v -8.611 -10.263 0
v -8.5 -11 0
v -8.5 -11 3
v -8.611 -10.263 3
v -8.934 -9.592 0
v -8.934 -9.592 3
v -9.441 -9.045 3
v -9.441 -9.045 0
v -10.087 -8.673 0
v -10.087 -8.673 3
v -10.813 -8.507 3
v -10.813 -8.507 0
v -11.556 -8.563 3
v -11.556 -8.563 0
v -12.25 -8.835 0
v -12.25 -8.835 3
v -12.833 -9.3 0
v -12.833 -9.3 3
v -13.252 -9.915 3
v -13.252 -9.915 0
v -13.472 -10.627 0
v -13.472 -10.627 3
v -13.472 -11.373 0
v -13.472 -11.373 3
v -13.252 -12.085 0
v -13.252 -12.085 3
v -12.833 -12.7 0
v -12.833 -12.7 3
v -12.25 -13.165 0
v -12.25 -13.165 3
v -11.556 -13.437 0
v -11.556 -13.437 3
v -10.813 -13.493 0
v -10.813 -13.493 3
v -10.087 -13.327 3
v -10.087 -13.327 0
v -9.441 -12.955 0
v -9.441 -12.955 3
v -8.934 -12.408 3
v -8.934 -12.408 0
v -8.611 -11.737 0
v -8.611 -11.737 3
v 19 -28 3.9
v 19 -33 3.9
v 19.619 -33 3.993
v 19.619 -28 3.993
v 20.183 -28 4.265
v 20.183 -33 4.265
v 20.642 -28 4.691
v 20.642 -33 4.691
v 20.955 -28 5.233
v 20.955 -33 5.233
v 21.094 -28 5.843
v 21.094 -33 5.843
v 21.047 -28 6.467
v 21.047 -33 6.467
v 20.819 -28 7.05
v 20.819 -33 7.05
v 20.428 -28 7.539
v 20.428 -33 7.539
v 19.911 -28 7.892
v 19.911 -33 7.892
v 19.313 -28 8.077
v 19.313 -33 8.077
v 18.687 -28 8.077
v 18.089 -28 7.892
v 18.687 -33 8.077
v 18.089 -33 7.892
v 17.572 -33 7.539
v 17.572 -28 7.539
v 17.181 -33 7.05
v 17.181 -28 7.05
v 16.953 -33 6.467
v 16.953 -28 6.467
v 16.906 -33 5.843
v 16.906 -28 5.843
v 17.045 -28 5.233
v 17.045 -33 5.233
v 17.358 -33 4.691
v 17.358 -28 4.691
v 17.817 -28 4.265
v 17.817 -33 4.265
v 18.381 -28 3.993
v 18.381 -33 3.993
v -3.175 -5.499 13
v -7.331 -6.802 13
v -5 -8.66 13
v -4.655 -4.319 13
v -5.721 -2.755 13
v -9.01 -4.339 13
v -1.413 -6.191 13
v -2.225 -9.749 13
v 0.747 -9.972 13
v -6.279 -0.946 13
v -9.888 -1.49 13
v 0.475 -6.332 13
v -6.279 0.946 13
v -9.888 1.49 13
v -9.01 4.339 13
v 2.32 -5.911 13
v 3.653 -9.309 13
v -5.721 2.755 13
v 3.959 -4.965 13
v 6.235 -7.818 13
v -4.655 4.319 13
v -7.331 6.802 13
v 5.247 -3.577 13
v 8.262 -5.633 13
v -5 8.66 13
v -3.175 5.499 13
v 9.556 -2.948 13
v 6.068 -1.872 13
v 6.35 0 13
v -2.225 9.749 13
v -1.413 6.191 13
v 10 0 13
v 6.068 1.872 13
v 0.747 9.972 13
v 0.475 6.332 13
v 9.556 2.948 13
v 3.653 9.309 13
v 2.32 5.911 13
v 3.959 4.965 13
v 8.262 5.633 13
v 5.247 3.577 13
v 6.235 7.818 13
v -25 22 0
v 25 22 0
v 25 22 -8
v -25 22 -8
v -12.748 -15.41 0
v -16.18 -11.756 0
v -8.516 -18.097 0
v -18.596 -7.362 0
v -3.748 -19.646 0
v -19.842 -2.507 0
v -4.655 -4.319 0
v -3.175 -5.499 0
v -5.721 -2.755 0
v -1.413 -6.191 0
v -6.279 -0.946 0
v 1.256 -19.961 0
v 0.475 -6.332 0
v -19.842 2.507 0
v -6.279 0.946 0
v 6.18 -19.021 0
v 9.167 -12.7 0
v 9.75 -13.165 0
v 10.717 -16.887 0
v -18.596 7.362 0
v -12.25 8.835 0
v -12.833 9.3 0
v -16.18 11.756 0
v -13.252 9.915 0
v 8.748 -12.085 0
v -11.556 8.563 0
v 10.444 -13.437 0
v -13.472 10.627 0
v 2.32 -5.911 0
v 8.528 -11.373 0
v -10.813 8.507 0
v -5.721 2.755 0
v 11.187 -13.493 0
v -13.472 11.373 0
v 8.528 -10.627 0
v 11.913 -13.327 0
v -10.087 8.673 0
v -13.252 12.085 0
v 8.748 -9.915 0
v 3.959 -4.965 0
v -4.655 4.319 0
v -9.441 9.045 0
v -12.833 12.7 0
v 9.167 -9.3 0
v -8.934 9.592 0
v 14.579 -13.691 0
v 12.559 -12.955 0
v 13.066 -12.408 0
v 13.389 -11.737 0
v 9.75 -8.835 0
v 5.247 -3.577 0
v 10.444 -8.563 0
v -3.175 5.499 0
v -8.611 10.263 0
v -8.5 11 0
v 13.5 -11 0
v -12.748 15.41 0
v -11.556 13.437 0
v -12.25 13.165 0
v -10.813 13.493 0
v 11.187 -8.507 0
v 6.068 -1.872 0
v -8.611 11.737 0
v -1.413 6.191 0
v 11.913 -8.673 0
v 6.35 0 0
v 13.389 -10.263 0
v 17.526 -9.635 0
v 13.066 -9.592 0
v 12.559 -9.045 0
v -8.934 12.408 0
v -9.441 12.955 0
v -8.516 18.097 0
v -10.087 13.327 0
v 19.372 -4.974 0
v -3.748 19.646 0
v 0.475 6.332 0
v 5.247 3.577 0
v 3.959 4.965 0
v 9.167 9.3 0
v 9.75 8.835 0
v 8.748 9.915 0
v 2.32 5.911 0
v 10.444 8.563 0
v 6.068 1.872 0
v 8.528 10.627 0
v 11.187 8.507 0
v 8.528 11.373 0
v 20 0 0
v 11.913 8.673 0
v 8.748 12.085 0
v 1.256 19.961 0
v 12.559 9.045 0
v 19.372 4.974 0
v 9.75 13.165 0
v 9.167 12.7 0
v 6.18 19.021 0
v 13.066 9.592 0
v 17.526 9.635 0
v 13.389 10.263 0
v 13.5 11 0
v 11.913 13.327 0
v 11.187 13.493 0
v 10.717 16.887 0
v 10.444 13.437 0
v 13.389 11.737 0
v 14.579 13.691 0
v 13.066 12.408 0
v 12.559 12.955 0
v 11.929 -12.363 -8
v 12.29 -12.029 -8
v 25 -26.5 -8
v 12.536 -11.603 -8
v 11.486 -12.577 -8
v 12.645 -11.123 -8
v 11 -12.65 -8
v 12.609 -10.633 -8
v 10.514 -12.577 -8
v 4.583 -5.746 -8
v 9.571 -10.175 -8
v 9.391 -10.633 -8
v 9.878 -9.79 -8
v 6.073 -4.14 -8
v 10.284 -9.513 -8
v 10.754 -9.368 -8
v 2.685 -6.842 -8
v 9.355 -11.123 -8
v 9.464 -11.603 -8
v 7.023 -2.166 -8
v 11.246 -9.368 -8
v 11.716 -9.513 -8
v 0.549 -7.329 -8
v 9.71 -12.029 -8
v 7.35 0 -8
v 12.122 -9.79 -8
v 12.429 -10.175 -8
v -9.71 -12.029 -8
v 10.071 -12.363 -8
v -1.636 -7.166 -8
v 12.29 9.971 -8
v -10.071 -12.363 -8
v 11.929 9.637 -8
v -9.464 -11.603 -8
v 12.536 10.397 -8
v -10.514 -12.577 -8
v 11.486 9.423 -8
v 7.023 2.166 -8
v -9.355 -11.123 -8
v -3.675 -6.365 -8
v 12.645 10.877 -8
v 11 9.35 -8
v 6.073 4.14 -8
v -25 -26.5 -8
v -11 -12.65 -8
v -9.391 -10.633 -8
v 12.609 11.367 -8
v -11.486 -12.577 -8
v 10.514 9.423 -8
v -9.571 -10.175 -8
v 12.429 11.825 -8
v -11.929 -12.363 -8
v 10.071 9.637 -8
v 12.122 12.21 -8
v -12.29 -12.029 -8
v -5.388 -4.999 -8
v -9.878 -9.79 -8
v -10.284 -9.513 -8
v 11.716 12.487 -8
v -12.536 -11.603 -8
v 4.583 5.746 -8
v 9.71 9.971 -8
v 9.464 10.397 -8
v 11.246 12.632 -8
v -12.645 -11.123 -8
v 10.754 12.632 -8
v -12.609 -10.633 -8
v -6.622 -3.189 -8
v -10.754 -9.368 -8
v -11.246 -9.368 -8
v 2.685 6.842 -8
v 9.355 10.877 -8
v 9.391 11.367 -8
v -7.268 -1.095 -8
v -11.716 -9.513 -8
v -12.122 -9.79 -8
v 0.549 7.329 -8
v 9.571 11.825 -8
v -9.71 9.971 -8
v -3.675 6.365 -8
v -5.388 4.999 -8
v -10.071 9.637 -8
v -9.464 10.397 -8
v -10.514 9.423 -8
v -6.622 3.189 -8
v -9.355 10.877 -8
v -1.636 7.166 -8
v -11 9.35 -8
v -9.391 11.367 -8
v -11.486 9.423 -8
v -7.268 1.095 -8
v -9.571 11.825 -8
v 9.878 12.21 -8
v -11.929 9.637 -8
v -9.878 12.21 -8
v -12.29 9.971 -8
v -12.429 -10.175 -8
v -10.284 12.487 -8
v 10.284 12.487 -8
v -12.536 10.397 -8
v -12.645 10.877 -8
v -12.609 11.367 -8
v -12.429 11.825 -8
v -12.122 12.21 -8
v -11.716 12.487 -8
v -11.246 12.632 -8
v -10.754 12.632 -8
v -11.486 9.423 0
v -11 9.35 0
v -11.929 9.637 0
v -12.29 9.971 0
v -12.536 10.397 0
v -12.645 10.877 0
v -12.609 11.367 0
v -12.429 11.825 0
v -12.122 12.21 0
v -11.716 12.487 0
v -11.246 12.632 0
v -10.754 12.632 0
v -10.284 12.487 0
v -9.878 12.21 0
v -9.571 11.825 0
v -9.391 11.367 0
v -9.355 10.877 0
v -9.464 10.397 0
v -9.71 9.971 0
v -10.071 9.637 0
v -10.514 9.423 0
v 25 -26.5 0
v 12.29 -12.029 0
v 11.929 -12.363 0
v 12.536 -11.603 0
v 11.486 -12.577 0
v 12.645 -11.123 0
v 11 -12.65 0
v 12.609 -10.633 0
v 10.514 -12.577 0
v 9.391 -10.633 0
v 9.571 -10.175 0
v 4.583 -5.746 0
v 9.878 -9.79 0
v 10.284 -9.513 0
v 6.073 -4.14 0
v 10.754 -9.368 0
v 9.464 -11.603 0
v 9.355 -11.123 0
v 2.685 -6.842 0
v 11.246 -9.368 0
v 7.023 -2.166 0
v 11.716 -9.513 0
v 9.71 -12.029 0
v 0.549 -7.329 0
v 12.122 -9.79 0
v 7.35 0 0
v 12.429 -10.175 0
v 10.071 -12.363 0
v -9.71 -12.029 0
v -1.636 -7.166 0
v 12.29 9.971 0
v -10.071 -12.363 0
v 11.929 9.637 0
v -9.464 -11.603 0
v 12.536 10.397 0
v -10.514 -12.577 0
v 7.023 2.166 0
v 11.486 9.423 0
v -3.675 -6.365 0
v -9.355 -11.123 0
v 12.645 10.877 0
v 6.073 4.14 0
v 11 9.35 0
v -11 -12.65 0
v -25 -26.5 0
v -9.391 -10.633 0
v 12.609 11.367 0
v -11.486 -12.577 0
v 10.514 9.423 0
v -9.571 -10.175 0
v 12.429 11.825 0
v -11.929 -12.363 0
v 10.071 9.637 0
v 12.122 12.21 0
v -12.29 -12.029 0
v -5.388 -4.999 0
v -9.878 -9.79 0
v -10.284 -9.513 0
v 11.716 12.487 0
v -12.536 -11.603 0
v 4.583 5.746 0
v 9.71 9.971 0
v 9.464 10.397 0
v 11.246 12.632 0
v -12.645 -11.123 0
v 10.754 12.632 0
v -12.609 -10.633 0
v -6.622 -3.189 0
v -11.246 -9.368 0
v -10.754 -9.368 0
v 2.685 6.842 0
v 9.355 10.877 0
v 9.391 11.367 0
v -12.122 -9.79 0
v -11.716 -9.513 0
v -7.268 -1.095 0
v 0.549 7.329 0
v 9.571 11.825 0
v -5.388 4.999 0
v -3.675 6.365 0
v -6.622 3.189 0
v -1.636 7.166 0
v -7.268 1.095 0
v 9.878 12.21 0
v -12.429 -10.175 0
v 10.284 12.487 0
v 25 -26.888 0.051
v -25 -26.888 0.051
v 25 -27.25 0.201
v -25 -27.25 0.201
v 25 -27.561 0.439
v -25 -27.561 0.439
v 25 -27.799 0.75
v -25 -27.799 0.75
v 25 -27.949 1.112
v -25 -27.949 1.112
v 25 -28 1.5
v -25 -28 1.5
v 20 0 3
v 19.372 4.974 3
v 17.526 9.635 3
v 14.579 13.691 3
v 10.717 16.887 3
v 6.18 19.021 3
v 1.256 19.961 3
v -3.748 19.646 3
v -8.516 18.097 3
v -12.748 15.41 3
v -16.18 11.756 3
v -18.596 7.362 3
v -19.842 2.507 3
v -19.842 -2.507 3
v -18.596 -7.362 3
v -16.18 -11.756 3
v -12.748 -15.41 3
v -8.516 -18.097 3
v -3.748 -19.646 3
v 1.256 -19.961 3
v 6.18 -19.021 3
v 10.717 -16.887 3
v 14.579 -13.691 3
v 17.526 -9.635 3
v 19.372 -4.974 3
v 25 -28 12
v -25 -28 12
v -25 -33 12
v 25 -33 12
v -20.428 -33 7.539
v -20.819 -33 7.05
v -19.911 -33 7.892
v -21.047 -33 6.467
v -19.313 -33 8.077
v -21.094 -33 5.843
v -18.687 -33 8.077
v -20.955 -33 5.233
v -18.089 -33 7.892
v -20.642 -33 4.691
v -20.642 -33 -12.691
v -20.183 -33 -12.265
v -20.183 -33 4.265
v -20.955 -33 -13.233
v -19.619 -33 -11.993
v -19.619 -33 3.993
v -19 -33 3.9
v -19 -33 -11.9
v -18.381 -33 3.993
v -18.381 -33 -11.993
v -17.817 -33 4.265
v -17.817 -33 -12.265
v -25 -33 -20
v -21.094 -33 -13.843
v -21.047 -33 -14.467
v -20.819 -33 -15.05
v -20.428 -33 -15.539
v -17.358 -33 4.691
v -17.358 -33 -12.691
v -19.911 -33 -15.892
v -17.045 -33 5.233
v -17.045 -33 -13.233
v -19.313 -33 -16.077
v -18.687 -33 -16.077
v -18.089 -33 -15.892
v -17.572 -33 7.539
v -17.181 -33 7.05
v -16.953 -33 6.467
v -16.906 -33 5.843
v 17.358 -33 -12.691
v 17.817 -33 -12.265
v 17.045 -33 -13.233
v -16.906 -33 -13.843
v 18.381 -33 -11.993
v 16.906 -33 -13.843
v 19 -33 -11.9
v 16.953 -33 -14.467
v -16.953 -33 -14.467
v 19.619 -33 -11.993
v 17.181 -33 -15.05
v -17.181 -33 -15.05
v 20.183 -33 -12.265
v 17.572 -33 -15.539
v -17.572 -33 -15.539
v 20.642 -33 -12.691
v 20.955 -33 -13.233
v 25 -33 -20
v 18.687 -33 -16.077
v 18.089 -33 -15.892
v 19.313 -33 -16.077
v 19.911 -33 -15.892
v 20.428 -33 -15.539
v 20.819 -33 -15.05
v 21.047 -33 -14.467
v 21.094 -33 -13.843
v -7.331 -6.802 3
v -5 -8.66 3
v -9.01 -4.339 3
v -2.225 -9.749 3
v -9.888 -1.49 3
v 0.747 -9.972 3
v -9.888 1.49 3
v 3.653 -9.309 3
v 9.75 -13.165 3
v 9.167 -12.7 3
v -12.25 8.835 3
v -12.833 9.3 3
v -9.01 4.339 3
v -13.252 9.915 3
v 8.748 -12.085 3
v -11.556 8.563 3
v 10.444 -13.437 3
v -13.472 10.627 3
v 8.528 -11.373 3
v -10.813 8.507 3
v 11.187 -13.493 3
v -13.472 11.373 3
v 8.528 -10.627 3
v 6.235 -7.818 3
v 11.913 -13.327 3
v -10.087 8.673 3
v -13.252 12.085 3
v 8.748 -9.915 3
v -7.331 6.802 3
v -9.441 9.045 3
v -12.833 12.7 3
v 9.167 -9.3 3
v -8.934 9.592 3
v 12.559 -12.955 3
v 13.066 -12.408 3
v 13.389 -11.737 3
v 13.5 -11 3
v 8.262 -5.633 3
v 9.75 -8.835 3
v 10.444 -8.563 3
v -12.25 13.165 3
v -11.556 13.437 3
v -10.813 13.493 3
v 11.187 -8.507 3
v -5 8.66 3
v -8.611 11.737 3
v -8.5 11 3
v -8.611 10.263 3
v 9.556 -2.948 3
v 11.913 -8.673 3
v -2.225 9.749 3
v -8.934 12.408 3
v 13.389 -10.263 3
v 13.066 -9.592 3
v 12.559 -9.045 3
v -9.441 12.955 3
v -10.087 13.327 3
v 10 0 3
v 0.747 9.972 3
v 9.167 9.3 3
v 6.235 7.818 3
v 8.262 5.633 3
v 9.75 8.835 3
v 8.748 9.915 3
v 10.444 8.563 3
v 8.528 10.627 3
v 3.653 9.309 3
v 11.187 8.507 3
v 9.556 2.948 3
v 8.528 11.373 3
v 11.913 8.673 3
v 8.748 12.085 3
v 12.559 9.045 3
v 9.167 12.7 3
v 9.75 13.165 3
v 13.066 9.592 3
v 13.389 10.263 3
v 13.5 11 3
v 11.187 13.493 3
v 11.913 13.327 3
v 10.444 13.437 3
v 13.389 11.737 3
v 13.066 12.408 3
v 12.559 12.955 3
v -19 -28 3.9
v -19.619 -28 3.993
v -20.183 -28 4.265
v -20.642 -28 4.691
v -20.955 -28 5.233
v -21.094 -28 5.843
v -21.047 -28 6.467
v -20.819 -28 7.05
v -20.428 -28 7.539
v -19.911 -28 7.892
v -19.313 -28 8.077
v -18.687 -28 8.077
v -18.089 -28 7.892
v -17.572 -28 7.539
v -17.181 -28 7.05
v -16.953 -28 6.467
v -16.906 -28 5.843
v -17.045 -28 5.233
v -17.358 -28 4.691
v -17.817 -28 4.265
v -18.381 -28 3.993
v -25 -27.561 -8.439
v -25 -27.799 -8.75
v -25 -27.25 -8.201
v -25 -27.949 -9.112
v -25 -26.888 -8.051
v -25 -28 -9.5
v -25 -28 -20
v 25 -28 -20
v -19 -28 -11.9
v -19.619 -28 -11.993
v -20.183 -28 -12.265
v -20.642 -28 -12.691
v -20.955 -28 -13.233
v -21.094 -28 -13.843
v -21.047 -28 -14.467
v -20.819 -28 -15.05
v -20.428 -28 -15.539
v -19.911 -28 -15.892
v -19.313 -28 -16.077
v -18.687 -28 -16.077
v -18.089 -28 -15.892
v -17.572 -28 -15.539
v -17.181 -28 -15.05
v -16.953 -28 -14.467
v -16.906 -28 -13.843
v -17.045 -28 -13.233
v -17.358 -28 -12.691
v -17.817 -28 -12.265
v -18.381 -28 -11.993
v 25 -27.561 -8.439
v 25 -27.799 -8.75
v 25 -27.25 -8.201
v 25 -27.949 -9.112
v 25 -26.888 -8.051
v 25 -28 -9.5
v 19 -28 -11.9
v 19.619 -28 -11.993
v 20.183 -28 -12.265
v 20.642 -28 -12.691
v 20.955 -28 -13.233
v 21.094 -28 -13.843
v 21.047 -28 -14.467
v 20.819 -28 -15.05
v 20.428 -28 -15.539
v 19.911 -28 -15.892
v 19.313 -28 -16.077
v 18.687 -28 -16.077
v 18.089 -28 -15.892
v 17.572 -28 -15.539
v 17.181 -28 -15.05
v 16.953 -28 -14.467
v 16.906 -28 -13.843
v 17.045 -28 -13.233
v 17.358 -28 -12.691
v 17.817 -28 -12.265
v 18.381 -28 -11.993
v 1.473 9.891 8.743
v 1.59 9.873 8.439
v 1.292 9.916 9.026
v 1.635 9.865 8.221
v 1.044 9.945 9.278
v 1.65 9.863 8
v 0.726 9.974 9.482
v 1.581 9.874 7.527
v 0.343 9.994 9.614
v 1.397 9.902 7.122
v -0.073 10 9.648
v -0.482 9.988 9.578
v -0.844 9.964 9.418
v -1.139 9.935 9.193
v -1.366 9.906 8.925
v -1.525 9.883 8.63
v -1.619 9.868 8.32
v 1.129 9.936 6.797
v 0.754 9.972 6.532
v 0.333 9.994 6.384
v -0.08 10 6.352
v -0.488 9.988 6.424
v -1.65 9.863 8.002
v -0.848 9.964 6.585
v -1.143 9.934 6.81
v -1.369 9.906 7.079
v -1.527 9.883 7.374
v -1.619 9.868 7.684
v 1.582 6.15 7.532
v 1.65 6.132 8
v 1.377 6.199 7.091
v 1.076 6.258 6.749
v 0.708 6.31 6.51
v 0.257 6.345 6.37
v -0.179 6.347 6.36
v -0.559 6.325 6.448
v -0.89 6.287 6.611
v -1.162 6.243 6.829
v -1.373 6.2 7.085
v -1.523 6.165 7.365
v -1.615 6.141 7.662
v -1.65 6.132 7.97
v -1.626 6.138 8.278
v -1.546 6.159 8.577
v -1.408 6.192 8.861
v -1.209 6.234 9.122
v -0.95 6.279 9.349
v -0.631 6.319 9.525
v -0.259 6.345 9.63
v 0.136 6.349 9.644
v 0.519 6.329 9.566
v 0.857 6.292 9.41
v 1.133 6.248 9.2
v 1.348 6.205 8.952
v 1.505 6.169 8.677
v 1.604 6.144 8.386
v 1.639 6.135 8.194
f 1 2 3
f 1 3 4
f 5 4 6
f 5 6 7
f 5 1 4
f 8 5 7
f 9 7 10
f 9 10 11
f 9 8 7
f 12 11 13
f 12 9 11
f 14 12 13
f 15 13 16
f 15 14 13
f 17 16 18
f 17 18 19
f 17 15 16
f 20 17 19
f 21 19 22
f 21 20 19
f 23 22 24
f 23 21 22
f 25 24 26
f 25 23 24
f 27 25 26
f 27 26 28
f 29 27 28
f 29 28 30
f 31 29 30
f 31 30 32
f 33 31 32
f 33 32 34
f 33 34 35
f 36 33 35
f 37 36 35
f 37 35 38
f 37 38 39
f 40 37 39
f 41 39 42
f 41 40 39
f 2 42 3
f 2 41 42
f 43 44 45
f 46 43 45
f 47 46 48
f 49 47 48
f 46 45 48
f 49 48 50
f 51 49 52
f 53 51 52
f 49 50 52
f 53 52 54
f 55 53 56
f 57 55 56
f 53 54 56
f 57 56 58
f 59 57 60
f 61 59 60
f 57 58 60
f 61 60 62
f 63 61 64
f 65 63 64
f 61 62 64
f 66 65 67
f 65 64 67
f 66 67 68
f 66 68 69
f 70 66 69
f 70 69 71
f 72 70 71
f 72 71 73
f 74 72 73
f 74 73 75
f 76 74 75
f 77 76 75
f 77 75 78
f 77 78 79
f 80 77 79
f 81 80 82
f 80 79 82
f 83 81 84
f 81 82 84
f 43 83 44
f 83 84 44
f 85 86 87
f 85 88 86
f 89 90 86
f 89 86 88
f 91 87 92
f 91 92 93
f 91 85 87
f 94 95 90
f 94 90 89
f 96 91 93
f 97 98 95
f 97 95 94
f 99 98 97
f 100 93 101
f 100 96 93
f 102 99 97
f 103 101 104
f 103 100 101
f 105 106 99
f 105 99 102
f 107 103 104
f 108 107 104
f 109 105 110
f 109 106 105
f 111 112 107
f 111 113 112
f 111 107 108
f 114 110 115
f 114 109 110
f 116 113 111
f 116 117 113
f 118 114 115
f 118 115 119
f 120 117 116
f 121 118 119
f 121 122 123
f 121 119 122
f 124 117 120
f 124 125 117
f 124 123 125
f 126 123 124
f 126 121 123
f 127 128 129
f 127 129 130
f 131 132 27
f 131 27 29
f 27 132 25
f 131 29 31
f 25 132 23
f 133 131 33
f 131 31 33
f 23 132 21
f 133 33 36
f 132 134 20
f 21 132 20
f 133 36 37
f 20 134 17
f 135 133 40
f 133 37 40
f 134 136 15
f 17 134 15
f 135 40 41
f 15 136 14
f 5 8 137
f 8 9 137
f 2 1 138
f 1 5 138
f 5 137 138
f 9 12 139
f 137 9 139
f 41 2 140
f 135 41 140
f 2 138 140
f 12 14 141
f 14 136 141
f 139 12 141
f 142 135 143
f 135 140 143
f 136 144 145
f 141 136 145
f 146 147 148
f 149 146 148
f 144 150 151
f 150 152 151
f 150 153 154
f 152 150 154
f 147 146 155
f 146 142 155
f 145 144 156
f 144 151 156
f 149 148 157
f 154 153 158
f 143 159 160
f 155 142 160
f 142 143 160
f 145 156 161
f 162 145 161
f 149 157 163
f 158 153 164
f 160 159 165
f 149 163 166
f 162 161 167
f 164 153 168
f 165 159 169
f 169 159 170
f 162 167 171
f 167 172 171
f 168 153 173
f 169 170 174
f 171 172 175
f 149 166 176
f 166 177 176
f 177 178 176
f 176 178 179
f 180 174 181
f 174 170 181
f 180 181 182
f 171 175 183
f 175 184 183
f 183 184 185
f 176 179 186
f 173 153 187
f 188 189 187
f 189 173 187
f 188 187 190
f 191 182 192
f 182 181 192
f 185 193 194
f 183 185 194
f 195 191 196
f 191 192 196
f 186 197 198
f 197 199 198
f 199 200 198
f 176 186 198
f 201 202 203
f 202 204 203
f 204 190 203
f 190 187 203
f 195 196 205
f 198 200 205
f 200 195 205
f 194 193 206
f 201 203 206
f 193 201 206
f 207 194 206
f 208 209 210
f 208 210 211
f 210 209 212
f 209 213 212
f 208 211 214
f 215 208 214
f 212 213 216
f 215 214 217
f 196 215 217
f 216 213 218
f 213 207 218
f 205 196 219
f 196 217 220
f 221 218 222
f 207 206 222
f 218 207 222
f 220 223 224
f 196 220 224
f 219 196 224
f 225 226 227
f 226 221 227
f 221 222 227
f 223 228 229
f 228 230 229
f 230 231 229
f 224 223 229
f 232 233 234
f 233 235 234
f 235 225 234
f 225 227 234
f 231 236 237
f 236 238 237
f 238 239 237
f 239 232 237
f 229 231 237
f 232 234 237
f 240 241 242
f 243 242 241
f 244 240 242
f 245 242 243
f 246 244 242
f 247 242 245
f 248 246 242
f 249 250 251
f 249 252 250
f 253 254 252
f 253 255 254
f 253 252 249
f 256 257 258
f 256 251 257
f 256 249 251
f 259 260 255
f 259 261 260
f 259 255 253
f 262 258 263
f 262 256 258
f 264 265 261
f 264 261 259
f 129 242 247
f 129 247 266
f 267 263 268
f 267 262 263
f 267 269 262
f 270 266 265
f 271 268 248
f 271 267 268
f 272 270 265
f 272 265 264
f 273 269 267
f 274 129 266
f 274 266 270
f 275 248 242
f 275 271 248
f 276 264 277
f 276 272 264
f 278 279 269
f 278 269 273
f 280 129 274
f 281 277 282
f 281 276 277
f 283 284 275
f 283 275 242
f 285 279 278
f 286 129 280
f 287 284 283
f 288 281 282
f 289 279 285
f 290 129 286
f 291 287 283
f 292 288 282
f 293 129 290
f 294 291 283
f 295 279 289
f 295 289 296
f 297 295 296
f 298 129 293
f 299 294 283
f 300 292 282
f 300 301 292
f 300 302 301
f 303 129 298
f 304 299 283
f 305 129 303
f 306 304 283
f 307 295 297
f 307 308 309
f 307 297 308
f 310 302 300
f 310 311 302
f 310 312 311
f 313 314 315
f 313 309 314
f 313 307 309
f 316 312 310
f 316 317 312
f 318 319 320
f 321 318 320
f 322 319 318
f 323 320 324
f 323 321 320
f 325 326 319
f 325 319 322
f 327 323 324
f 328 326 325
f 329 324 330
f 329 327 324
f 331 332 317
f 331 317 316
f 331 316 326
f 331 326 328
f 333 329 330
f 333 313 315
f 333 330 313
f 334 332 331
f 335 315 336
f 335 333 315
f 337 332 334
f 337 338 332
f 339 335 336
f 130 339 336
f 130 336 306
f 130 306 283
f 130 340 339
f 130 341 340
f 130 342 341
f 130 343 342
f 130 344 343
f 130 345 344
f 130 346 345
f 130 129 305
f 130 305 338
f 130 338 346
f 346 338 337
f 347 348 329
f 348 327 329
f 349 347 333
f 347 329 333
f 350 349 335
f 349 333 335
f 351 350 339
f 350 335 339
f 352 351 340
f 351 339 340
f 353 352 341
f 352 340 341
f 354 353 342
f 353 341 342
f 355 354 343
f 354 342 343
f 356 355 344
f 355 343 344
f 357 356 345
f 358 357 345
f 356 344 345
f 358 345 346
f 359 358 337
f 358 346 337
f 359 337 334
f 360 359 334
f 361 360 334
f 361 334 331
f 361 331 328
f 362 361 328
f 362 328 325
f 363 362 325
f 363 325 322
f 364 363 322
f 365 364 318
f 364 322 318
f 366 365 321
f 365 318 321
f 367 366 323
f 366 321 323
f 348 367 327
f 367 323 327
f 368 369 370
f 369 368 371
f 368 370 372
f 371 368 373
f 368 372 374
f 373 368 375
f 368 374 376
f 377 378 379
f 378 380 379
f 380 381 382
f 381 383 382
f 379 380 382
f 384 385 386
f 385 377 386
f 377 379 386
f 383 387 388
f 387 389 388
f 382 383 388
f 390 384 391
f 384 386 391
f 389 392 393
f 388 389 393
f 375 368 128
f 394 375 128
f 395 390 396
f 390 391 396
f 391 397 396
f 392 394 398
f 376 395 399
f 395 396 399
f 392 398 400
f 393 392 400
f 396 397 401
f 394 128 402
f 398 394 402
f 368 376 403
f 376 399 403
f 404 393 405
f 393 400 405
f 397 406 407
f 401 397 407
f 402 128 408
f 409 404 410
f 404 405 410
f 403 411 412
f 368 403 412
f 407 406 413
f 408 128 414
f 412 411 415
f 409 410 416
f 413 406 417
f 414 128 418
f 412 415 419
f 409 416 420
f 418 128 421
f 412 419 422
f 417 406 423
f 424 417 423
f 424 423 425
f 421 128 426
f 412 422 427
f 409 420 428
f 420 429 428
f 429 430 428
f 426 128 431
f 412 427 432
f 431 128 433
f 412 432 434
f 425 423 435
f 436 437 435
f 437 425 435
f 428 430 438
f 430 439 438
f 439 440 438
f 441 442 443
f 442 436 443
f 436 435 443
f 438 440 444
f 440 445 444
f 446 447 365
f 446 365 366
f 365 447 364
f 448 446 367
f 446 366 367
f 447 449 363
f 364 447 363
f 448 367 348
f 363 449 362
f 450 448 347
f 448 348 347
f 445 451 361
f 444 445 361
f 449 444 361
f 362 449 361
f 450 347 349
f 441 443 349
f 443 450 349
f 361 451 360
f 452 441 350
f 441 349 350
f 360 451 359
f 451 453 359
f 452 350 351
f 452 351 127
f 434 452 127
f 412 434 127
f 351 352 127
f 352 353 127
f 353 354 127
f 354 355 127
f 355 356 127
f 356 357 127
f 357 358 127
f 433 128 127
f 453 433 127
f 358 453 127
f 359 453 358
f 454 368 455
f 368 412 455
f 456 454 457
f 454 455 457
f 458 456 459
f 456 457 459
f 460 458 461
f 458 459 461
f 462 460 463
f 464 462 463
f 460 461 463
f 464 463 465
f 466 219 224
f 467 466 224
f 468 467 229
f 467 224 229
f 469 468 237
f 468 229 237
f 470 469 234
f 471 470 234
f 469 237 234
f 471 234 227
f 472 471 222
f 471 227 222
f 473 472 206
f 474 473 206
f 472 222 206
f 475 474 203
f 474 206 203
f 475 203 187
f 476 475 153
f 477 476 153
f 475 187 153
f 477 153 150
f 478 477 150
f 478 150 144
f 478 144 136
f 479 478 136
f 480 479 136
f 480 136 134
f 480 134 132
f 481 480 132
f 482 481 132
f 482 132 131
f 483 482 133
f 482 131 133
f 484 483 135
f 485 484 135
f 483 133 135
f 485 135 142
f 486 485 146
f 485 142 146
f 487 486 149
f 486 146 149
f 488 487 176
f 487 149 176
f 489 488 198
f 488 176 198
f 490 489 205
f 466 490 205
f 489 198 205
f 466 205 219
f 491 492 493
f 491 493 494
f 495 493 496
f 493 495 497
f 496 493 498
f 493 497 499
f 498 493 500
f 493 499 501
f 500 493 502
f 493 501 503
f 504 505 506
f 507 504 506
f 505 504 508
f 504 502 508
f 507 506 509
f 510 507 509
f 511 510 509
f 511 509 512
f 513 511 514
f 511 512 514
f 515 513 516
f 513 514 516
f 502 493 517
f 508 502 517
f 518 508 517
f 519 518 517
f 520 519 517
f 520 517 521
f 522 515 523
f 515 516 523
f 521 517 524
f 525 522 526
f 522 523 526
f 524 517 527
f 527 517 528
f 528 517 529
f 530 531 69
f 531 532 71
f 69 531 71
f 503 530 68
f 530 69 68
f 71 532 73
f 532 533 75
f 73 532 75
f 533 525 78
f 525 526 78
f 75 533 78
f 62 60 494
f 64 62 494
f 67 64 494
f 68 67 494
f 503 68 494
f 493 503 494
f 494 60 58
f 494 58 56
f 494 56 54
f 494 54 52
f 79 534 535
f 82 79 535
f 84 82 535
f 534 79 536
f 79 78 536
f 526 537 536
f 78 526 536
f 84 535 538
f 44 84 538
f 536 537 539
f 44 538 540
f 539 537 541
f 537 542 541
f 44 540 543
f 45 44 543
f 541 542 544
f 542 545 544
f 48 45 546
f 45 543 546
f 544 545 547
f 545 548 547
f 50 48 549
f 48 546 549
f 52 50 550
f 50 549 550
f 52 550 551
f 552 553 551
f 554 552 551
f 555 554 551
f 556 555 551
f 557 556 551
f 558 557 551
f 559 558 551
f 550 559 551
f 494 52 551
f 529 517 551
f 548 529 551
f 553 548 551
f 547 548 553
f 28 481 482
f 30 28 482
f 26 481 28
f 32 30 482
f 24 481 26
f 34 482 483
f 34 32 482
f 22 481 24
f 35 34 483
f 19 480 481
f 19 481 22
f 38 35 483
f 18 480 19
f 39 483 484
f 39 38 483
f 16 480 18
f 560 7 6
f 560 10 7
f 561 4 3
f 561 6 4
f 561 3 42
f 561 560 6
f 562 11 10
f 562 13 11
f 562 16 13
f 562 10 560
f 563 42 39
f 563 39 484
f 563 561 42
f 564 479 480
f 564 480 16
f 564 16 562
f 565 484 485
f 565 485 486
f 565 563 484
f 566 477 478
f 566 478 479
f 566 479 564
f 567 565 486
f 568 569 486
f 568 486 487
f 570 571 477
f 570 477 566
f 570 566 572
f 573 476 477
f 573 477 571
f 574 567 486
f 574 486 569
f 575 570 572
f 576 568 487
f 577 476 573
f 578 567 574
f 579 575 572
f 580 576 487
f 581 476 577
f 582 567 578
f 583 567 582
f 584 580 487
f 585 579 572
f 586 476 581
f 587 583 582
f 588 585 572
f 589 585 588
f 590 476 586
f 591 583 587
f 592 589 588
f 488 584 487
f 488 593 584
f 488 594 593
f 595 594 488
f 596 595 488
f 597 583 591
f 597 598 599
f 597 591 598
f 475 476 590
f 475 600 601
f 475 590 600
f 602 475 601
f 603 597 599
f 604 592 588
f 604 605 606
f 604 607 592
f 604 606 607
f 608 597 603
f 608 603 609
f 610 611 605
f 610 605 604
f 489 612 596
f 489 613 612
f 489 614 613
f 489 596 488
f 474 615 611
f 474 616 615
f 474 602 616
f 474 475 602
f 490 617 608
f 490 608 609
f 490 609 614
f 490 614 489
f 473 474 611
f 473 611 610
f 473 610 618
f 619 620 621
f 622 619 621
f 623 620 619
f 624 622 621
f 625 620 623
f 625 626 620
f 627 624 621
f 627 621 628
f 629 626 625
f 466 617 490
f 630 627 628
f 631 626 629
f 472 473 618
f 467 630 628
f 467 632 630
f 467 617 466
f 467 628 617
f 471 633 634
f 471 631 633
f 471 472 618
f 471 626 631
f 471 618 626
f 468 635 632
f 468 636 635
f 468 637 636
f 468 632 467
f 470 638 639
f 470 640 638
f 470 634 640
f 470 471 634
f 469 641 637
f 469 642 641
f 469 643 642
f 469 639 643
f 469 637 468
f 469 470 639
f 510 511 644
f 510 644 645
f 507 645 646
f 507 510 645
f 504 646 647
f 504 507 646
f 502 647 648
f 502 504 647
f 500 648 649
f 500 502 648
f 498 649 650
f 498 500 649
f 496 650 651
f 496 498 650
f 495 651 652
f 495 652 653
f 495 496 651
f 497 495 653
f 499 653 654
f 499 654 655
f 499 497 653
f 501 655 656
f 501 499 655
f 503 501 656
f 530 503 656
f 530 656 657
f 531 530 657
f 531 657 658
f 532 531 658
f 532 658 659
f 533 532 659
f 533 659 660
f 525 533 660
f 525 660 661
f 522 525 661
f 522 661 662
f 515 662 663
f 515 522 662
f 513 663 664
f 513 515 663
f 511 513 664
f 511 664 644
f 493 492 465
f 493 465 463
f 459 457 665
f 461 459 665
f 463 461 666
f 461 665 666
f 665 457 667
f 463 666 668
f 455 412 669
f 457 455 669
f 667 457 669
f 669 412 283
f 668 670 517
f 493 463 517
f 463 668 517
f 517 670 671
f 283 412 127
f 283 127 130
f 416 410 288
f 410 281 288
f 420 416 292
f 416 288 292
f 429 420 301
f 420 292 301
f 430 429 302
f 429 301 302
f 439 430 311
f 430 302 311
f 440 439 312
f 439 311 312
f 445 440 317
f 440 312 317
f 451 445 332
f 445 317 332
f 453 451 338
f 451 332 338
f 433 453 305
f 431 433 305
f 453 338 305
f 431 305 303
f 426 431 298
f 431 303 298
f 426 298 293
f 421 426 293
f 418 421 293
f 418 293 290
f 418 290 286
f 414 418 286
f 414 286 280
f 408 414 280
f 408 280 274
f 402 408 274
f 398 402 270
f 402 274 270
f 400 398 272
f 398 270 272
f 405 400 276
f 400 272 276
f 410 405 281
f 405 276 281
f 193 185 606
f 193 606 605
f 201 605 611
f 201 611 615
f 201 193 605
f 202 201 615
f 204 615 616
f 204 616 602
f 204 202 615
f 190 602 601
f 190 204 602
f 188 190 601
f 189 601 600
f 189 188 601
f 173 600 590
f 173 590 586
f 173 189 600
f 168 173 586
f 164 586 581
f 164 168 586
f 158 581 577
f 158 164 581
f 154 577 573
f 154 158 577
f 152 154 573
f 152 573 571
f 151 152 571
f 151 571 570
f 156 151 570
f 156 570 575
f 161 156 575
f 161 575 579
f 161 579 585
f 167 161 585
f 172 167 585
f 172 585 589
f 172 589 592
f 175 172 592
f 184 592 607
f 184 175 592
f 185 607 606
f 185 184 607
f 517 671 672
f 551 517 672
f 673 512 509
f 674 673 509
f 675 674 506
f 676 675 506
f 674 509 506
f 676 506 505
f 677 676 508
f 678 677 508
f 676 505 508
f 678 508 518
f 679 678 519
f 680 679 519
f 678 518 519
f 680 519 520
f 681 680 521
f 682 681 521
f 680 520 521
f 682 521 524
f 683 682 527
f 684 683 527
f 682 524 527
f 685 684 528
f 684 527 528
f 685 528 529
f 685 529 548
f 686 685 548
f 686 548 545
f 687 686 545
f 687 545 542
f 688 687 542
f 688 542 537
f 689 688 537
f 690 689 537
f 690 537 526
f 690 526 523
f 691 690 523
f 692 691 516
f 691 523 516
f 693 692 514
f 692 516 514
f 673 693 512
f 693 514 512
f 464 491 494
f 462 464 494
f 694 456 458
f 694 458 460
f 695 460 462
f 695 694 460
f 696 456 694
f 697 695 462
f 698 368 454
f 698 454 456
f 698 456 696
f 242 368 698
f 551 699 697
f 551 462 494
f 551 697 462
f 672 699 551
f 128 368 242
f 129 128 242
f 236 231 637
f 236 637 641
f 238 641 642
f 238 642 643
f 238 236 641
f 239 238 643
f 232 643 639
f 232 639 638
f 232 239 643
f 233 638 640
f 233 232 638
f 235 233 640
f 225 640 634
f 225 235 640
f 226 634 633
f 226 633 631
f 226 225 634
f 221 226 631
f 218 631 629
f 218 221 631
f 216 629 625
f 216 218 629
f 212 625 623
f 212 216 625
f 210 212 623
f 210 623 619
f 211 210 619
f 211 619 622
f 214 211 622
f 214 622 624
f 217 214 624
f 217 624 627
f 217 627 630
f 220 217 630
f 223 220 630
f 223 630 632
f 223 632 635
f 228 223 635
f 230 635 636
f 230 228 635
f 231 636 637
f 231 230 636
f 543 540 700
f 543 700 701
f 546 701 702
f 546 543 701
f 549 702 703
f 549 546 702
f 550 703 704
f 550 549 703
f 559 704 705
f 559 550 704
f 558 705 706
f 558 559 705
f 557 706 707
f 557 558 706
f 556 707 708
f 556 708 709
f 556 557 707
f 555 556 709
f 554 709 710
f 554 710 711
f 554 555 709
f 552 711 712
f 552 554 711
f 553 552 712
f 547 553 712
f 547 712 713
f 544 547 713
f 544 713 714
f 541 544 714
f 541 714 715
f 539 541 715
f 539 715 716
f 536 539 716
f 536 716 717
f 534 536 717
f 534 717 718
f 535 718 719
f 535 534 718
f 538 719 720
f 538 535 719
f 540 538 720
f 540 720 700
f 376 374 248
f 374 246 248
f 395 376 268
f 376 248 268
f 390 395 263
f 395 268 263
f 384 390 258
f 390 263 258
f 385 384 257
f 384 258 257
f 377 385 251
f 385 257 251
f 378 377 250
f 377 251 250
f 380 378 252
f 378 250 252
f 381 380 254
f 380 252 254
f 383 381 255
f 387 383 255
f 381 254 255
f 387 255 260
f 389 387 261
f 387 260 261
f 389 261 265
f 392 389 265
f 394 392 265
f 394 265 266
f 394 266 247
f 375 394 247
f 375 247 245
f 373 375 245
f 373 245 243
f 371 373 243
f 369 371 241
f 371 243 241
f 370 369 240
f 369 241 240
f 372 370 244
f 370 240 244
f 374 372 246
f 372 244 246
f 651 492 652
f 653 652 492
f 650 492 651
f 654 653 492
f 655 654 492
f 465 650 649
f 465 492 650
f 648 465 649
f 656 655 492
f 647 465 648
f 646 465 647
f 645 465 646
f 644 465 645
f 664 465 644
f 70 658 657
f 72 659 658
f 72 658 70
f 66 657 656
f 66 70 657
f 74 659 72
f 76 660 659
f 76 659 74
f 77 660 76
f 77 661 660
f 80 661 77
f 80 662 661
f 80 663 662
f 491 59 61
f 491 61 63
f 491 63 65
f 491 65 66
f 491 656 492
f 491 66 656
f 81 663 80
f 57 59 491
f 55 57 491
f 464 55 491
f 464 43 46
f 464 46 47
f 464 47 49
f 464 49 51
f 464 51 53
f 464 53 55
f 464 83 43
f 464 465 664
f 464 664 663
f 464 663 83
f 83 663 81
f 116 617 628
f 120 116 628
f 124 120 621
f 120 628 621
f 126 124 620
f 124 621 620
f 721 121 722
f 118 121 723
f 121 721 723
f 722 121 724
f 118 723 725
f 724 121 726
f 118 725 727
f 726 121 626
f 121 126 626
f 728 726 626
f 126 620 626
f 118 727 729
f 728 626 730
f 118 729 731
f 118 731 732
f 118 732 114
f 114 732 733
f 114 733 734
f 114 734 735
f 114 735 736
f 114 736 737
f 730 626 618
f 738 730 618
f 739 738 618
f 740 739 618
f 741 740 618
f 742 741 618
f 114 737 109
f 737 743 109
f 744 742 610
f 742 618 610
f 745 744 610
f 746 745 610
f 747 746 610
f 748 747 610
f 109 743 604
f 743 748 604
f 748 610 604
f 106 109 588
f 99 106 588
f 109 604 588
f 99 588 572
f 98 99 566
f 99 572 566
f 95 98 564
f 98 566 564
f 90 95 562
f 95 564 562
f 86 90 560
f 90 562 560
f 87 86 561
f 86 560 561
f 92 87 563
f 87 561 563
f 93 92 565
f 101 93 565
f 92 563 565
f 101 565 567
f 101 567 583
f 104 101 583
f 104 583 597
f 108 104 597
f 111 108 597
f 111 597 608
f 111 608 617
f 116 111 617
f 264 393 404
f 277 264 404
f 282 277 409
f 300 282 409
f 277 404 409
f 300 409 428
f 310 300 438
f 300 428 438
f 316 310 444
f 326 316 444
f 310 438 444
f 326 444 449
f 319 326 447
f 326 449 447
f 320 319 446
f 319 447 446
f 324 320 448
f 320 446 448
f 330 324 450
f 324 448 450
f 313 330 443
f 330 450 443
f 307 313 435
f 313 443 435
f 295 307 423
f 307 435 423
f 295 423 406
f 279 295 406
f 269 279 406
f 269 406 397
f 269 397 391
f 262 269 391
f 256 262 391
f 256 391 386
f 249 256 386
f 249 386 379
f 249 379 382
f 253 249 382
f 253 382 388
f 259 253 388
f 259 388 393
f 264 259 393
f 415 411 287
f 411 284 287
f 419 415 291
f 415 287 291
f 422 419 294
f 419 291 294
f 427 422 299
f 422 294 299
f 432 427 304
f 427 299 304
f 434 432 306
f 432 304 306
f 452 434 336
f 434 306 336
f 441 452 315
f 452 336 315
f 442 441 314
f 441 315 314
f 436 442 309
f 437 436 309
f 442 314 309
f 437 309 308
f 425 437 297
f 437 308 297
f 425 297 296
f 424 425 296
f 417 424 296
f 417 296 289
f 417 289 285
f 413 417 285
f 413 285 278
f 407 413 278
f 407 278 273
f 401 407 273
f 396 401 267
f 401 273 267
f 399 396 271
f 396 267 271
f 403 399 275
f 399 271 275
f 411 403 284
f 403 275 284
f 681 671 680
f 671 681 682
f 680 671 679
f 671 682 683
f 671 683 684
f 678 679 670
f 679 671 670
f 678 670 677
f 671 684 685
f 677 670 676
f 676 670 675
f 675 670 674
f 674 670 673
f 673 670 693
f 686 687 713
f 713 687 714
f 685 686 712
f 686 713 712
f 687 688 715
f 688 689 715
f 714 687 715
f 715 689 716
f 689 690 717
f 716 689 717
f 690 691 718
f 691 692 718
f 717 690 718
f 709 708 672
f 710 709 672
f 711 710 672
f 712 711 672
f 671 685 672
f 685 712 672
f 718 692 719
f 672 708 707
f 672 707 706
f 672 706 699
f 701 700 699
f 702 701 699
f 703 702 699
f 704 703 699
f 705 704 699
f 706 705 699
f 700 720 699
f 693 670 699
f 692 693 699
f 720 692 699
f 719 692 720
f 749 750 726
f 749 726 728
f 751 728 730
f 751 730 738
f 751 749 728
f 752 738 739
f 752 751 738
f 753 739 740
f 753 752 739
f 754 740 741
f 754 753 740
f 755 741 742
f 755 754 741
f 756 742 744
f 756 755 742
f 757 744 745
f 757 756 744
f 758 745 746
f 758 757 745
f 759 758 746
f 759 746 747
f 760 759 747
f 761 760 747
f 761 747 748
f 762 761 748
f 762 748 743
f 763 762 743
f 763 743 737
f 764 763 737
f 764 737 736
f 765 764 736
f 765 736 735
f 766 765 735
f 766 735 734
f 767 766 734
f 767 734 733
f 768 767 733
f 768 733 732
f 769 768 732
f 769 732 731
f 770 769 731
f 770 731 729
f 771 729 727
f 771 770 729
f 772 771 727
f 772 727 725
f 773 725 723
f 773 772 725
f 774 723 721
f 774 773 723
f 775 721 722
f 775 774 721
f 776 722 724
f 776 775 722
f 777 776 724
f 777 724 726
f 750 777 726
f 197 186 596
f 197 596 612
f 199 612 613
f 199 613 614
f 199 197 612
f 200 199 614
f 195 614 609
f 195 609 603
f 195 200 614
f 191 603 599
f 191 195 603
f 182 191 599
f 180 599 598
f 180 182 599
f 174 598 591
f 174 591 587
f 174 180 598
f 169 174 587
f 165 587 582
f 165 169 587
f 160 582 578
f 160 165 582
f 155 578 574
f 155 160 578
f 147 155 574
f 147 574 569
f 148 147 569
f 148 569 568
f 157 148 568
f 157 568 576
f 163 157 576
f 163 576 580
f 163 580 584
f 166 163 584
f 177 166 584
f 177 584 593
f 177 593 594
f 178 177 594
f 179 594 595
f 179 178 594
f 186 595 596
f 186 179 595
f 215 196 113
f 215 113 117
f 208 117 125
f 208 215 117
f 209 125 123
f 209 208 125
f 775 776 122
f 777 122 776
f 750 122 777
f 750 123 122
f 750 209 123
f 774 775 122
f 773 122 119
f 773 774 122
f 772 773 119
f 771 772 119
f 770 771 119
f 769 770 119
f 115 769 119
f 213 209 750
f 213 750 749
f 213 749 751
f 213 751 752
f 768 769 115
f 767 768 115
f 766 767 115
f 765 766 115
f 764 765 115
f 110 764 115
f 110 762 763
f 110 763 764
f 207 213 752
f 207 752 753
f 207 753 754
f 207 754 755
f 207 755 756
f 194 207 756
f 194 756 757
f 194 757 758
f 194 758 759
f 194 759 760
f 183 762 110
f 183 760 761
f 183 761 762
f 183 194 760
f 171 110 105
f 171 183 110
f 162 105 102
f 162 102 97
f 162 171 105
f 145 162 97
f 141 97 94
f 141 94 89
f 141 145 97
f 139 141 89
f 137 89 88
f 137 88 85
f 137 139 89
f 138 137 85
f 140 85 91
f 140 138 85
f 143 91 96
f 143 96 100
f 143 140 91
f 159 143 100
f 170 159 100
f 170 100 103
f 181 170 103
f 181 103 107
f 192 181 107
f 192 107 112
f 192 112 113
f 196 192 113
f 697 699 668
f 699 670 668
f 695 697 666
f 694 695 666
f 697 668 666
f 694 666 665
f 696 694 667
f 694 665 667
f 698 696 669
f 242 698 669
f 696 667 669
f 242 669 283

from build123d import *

# Parameters (mm, degrees)
B01_SLIP_PLATE_CIRPATTERN1_START         = 18.556607454
B01_SLIP_PLATE_CIRPATTERN1_OUTLINE_R     = 20
B01_SLIP_PLATE_CIRPATTERN1_OUTLINE_R_2   = 2.5
B01_SLIP_PLATE_CIRPATTERN1_OUTLINE_R_3   = 6.35
B01_SLIP_PLATE_CIRPATTERN1_DEPTH         = 3
B01_SLIP_PLATE_CIRPATTERN1_START_2       = 21.556607454
B01_SLIP_PLATE_CIRPATTERN1_2_OUTLINE_R   = 10
B01_SLIP_PLATE_CIRPATTERN1_2_OUTLINE_R_2 = 6.35
B01_SLIP_PLATE_CIRPATTERN1_2_DEPTH       = 3.350001044
B01_SLIP_PLATE_CIRPATTERN1_START_3       = 28.206607555
B01_SLIP_PLATE_CIRPATTERN1_3_OUTLINE_R   = 10
B01_SLIP_PLATE_CIRPATTERN1_3_OUTLINE_R_2 = 6.35
B01_SLIP_PLATE_CIRPATTERN1_3_DEPTH       = 3.349999899
B01_SLIP_PLATE_CIRPATTERN1_START_4       = 24.906608498
B01_SLIP_PLATE_CIRPATTERN1_4_OUTLINE_R   = 10
B01_SLIP_PLATE_CIRPATTERN1_4_OUTLINE_R_2 = 6.35
B01_SLIP_PLATE_CIRPATTERN1_4_DEPTH       = 3.299999057
B01_SLIP_PLATE_CIRPATTERN1_START_5       = 15
B01_SLIP_PLATE_CIRPATTERN1_5_OUTLINE_R   = 1.65
B01_SLIP_PLATE_CIRPATTERN1_5_DEPTH       = 6
SKETCH5_W                                = 50
SKETCH5_H                                = 50
BOSS_EXTRUDE1_DEPTH                      = 8
SKETCH6_W                                = 1.65
SKETCH6_H                                = 8
M4_TAPPED_HOLE1_AT_2_COUNT               = 2
M4_TAPPED_HOLE1_AT_2_PITCH               = 22
M4_TAPPED_HOLE1_AT_3_COUNT               = 2
M4_TAPPED_HOLE1_AT_3_PITCH               = 31.112698372
M4_TAPPED_HOLE1_AT_4_COUNT               = 2
M4_TAPPED_HOLE1_AT_4_PITCH               = 22
SKETCH8_W                                = 50
SKETCH8_H                                = 16
BOSS_EXTRUDE2_DEPTH                      = 5
SKETCH10_W                               = 2.1
SKETCH10_H                               = 5.001
MIRROR2_COPY_1_SKETCH_W                  = 2.1
MIRROR2_COPY_1_SKETCH_H                  = 5.001
SKETCH11_R                               = 7.35
CUT_EXTRUDE1_DEPTH                       = 46.97825573
FILLET1_R                                = 1.5


with BuildPart() as part:
    # <B01_slip_plate>-<CirPattern1>: read off the stored shape, not the designer's step
    # <B01_slip_plate>-<CirPattern1> outline → <B01_slip_plate>-<CirPattern1> (new body)
    with BuildSketch(Plane.XY.offset(B01_SLIP_PLATE_CIRPATTERN1_START)):
        with Locations((-47.612606287, 9.667439862)):
            Circle(B01_SLIP_PLATE_CIRPATTERN1_OUTLINE_R)
        with Locations((-58.612606287, -1.332560138)):
            Circle(B01_SLIP_PLATE_CIRPATTERN1_OUTLINE_R_2, mode=Mode.SUBTRACT)
        with Locations((-36.612606287, -1.332560138)):
            Circle(B01_SLIP_PLATE_CIRPATTERN1_OUTLINE_R_2, mode=Mode.SUBTRACT)
        with Locations((-58.612606287, 20.667439862)):
            Circle(B01_SLIP_PLATE_CIRPATTERN1_OUTLINE_R_2, mode=Mode.SUBTRACT)
        with Locations((-36.612606287, 20.667439862)):
            Circle(B01_SLIP_PLATE_CIRPATTERN1_OUTLINE_R_2, mode=Mode.SUBTRACT)
        with Locations((-47.612606287, 9.667439862)):
            Circle(B01_SLIP_PLATE_CIRPATTERN1_OUTLINE_R_3, mode=Mode.SUBTRACT)
    extrude(amount=B01_SLIP_PLATE_CIRPATTERN1_DEPTH)

    # B01_slip_plate_-_CirPattern1 2 outline → B01_slip_plate_-_CirPattern1 2 (add)
    with BuildSketch(Plane.XY.offset(B01_SLIP_PLATE_CIRPATTERN1_START_2)):
        with Locations((-47.612606287, 9.667439862)):
            Circle(B01_SLIP_PLATE_CIRPATTERN1_2_OUTLINE_R)
        with Locations((-47.612606287, 9.667439862)):
            Circle(B01_SLIP_PLATE_CIRPATTERN1_2_OUTLINE_R_2, mode=Mode.SUBTRACT)
    extrude(amount=B01_SLIP_PLATE_CIRPATTERN1_2_DEPTH)



with BuildPart() as body_2:
    # B01_slip_plate_-_CirPattern1 3 outline → B01_slip_plate_-_CirPattern1 3 (new body)
    with BuildSketch(Plane.XY.offset(B01_SLIP_PLATE_CIRPATTERN1_START_3)):
        with Locations((-47.612606287, 9.667439862)):
            Circle(B01_SLIP_PLATE_CIRPATTERN1_3_OUTLINE_R)
        with Locations((-47.612606287, 9.667439862)):
            Circle(B01_SLIP_PLATE_CIRPATTERN1_3_OUTLINE_R_2, mode=Mode.SUBTRACT)
    extrude(amount=B01_SLIP_PLATE_CIRPATTERN1_3_DEPTH)


with BuildPart() as part_1:
    add(part.part)

    add(body_2.part)  # B01_slip_plate_-_CirPattern1 4 merges body 2
    # B01_slip_plate_-_CirPattern1 4 outline → B01_slip_plate_-_CirPattern1 4 (add)
    with BuildSketch(Plane.XY.offset(B01_SLIP_PLATE_CIRPATTERN1_START_4)):
        with Locations((-47.612606287, 9.667439862)):
            Circle(B01_SLIP_PLATE_CIRPATTERN1_4_OUTLINE_R)
        with Locations((-47.612606287, 9.667439862)):
            Circle(B01_SLIP_PLATE_CIRPATTERN1_4_OUTLINE_R_2, mode=Mode.SUBTRACT)
    extrude(amount=B01_SLIP_PLATE_CIRPATTERN1_4_DEPTH)

    # B01_slip_plate_-_CirPattern1 5 outline → B01_slip_plate_-_CirPattern1 5 (cut)
    with BuildSketch(Plane(origin=(0, 0, 0), x_dir=(1, 0, 0), z_dir=(0, 1, 0)).offset(B01_SLIP_PLATE_CIRPATTERN1_START_5)):
        with Locations((-47.612606287, -26.556607454)):
            Circle(B01_SLIP_PLATE_CIRPATTERN1_5_OUTLINE_R)
    extrude(amount=B01_SLIP_PLATE_CIRPATTERN1_5_DEPTH, mode=Mode.SUBTRACT)


with BuildPart() as part_2:
    # B01_slip_plate: read off the stored shape, not the designer's step
    # B01_slip_plate: moved
    add(part_1.part.moved(Location((47.6126063, -9.6674399, -18.5566075))))


with BuildPart() as body_2_2:
    # Sketch5 → Boss-Extrude1 (new body)
    with BuildSketch(Plane(origin=(0, 0, 0), x_dir=(-1, 0, 0), z_dir=(0, 0, -1))):
        with Locations((0, -3)):
            Rectangle(SKETCH5_W, SKETCH5_H)
    extrude(amount=BOSS_EXTRUDE1_DEPTH)

    # Sketch6 → M4 Tapped Hole1 (revolve, cut)
    with BuildSketch(Plane(origin=(-11, 11, 0), x_dir=(0, -1, 0), z_dir=(1, 0, 0))):
        with Locations((0.825, 4)):
            Rectangle(SKETCH6_W, SKETCH6_H)
    m4_tapped_hole1 = revolve(axis=Axis((-11, 11, 6.35), (0, 0, -1)), mode=Mode.SUBTRACT)

    # M4 Tapped Hole1 at 2: M4 Tapped Hole1 ×2
    with Locations(*[(i * M4_TAPPED_HOLE1_AT_2_PITCH, 0, 0) for i in range(1, M4_TAPPED_HOLE1_AT_2_COUNT)]):
        add(m4_tapped_hole1, mode=Mode.SUBTRACT)

    # M4 Tapped Hole1 at 3: M4 Tapped Hole1 ×2
    with Locations(*[Vector(0.7071067811865439, -0.7071067811865512, 0) * (i * M4_TAPPED_HOLE1_AT_3_PITCH) for i in range(1, M4_TAPPED_HOLE1_AT_3_COUNT)]):
        add(m4_tapped_hole1, mode=Mode.SUBTRACT)

    # M4 Tapped Hole1 at 4: M4 Tapped Hole1 ×2
    with Locations(*[(0, -i * M4_TAPPED_HOLE1_AT_4_PITCH, 0) for i in range(1, M4_TAPPED_HOLE1_AT_4_COUNT)]):
        add(m4_tapped_hole1, mode=Mode.SUBTRACT)

    # Sketch8 → Boss-Extrude2 (add)
    with BuildSketch(Plane.XZ.offset(28)):
        with Locations((0, -12)):
            Rectangle(SKETCH8_W, SKETCH8_H)
    boss_extrude2 = extrude(amount=BOSS_EXTRUDE2_DEPTH)

    # Sketch10 → Ø4.2 (4.2) Diameter Hole1 (revolve, cut)
    with BuildSketch(Plane(origin=(-19, -28, -14), x_dir=(0, 0, 1), z_dir=(1, 0, 0))):
        with Locations((1.05, 2.5005)):
            Rectangle(SKETCH10_W, SKETCH10_H)
    f_4_2_4_2_diameter_hole1 = revolve(axis=Axis((-19, -21.65, -14), (0, -1, 0)), mode=Mode.SUBTRACT)

    # Mirror1: Ø4.2 (4.2) Diameter Hole1 across plane
    add(f_4_2_4_2_diameter_hole1.mirror(Plane(origin=(0, 0, 0), x_dir=(0, 0, 1), z_dir=(1, 0, 0))), mode=Mode.SUBTRACT)

    # Mirror2: Boss-Extrude2, Ø4.2 (4.2) Diameter Hole1 across plane
    add(boss_extrude2.mirror(Plane.XY.offset(-4)))
    add(f_4_2_4_2_diameter_hole1.mirror(Plane.XY.offset(-4)), mode=Mode.SUBTRACT)

    # Mirror2 copy 1 sketch → Mirror2 copy 1 (revolve, cut)
    with BuildSketch(Plane(origin=(19, -28, 6), x_dir=(0, 0, -1), z_dir=(-1, 0, 0))):
        with Locations((1.05, 2.5005)):
            Rectangle(MIRROR2_COPY_1_SKETCH_W, MIRROR2_COPY_1_SKETCH_H)
    revolve(axis=Axis((19, -21.65, 6), (0, -1, 0)), mode=Mode.SUBTRACT)

    # Sketch11 → Cut-Extrude1 (cut, through all)
    with BuildSketch(Plane.XY):
        Circle(SKETCH11_R)
    extrude(amount=-CUT_EXTRUDE1_DEPTH, mode=Mode.SUBTRACT)

    # Fillet1
    fillet1_edges = [body_2_2.edges().sort_by_distance(p)[0] for p in [
        (0, -28, 0),
        (0, -28, -8),
    ]]
    fillet(fillet1_edges, radius=FILLET1_R)


solid = Compound([part_2.part, body_2_2.part])
